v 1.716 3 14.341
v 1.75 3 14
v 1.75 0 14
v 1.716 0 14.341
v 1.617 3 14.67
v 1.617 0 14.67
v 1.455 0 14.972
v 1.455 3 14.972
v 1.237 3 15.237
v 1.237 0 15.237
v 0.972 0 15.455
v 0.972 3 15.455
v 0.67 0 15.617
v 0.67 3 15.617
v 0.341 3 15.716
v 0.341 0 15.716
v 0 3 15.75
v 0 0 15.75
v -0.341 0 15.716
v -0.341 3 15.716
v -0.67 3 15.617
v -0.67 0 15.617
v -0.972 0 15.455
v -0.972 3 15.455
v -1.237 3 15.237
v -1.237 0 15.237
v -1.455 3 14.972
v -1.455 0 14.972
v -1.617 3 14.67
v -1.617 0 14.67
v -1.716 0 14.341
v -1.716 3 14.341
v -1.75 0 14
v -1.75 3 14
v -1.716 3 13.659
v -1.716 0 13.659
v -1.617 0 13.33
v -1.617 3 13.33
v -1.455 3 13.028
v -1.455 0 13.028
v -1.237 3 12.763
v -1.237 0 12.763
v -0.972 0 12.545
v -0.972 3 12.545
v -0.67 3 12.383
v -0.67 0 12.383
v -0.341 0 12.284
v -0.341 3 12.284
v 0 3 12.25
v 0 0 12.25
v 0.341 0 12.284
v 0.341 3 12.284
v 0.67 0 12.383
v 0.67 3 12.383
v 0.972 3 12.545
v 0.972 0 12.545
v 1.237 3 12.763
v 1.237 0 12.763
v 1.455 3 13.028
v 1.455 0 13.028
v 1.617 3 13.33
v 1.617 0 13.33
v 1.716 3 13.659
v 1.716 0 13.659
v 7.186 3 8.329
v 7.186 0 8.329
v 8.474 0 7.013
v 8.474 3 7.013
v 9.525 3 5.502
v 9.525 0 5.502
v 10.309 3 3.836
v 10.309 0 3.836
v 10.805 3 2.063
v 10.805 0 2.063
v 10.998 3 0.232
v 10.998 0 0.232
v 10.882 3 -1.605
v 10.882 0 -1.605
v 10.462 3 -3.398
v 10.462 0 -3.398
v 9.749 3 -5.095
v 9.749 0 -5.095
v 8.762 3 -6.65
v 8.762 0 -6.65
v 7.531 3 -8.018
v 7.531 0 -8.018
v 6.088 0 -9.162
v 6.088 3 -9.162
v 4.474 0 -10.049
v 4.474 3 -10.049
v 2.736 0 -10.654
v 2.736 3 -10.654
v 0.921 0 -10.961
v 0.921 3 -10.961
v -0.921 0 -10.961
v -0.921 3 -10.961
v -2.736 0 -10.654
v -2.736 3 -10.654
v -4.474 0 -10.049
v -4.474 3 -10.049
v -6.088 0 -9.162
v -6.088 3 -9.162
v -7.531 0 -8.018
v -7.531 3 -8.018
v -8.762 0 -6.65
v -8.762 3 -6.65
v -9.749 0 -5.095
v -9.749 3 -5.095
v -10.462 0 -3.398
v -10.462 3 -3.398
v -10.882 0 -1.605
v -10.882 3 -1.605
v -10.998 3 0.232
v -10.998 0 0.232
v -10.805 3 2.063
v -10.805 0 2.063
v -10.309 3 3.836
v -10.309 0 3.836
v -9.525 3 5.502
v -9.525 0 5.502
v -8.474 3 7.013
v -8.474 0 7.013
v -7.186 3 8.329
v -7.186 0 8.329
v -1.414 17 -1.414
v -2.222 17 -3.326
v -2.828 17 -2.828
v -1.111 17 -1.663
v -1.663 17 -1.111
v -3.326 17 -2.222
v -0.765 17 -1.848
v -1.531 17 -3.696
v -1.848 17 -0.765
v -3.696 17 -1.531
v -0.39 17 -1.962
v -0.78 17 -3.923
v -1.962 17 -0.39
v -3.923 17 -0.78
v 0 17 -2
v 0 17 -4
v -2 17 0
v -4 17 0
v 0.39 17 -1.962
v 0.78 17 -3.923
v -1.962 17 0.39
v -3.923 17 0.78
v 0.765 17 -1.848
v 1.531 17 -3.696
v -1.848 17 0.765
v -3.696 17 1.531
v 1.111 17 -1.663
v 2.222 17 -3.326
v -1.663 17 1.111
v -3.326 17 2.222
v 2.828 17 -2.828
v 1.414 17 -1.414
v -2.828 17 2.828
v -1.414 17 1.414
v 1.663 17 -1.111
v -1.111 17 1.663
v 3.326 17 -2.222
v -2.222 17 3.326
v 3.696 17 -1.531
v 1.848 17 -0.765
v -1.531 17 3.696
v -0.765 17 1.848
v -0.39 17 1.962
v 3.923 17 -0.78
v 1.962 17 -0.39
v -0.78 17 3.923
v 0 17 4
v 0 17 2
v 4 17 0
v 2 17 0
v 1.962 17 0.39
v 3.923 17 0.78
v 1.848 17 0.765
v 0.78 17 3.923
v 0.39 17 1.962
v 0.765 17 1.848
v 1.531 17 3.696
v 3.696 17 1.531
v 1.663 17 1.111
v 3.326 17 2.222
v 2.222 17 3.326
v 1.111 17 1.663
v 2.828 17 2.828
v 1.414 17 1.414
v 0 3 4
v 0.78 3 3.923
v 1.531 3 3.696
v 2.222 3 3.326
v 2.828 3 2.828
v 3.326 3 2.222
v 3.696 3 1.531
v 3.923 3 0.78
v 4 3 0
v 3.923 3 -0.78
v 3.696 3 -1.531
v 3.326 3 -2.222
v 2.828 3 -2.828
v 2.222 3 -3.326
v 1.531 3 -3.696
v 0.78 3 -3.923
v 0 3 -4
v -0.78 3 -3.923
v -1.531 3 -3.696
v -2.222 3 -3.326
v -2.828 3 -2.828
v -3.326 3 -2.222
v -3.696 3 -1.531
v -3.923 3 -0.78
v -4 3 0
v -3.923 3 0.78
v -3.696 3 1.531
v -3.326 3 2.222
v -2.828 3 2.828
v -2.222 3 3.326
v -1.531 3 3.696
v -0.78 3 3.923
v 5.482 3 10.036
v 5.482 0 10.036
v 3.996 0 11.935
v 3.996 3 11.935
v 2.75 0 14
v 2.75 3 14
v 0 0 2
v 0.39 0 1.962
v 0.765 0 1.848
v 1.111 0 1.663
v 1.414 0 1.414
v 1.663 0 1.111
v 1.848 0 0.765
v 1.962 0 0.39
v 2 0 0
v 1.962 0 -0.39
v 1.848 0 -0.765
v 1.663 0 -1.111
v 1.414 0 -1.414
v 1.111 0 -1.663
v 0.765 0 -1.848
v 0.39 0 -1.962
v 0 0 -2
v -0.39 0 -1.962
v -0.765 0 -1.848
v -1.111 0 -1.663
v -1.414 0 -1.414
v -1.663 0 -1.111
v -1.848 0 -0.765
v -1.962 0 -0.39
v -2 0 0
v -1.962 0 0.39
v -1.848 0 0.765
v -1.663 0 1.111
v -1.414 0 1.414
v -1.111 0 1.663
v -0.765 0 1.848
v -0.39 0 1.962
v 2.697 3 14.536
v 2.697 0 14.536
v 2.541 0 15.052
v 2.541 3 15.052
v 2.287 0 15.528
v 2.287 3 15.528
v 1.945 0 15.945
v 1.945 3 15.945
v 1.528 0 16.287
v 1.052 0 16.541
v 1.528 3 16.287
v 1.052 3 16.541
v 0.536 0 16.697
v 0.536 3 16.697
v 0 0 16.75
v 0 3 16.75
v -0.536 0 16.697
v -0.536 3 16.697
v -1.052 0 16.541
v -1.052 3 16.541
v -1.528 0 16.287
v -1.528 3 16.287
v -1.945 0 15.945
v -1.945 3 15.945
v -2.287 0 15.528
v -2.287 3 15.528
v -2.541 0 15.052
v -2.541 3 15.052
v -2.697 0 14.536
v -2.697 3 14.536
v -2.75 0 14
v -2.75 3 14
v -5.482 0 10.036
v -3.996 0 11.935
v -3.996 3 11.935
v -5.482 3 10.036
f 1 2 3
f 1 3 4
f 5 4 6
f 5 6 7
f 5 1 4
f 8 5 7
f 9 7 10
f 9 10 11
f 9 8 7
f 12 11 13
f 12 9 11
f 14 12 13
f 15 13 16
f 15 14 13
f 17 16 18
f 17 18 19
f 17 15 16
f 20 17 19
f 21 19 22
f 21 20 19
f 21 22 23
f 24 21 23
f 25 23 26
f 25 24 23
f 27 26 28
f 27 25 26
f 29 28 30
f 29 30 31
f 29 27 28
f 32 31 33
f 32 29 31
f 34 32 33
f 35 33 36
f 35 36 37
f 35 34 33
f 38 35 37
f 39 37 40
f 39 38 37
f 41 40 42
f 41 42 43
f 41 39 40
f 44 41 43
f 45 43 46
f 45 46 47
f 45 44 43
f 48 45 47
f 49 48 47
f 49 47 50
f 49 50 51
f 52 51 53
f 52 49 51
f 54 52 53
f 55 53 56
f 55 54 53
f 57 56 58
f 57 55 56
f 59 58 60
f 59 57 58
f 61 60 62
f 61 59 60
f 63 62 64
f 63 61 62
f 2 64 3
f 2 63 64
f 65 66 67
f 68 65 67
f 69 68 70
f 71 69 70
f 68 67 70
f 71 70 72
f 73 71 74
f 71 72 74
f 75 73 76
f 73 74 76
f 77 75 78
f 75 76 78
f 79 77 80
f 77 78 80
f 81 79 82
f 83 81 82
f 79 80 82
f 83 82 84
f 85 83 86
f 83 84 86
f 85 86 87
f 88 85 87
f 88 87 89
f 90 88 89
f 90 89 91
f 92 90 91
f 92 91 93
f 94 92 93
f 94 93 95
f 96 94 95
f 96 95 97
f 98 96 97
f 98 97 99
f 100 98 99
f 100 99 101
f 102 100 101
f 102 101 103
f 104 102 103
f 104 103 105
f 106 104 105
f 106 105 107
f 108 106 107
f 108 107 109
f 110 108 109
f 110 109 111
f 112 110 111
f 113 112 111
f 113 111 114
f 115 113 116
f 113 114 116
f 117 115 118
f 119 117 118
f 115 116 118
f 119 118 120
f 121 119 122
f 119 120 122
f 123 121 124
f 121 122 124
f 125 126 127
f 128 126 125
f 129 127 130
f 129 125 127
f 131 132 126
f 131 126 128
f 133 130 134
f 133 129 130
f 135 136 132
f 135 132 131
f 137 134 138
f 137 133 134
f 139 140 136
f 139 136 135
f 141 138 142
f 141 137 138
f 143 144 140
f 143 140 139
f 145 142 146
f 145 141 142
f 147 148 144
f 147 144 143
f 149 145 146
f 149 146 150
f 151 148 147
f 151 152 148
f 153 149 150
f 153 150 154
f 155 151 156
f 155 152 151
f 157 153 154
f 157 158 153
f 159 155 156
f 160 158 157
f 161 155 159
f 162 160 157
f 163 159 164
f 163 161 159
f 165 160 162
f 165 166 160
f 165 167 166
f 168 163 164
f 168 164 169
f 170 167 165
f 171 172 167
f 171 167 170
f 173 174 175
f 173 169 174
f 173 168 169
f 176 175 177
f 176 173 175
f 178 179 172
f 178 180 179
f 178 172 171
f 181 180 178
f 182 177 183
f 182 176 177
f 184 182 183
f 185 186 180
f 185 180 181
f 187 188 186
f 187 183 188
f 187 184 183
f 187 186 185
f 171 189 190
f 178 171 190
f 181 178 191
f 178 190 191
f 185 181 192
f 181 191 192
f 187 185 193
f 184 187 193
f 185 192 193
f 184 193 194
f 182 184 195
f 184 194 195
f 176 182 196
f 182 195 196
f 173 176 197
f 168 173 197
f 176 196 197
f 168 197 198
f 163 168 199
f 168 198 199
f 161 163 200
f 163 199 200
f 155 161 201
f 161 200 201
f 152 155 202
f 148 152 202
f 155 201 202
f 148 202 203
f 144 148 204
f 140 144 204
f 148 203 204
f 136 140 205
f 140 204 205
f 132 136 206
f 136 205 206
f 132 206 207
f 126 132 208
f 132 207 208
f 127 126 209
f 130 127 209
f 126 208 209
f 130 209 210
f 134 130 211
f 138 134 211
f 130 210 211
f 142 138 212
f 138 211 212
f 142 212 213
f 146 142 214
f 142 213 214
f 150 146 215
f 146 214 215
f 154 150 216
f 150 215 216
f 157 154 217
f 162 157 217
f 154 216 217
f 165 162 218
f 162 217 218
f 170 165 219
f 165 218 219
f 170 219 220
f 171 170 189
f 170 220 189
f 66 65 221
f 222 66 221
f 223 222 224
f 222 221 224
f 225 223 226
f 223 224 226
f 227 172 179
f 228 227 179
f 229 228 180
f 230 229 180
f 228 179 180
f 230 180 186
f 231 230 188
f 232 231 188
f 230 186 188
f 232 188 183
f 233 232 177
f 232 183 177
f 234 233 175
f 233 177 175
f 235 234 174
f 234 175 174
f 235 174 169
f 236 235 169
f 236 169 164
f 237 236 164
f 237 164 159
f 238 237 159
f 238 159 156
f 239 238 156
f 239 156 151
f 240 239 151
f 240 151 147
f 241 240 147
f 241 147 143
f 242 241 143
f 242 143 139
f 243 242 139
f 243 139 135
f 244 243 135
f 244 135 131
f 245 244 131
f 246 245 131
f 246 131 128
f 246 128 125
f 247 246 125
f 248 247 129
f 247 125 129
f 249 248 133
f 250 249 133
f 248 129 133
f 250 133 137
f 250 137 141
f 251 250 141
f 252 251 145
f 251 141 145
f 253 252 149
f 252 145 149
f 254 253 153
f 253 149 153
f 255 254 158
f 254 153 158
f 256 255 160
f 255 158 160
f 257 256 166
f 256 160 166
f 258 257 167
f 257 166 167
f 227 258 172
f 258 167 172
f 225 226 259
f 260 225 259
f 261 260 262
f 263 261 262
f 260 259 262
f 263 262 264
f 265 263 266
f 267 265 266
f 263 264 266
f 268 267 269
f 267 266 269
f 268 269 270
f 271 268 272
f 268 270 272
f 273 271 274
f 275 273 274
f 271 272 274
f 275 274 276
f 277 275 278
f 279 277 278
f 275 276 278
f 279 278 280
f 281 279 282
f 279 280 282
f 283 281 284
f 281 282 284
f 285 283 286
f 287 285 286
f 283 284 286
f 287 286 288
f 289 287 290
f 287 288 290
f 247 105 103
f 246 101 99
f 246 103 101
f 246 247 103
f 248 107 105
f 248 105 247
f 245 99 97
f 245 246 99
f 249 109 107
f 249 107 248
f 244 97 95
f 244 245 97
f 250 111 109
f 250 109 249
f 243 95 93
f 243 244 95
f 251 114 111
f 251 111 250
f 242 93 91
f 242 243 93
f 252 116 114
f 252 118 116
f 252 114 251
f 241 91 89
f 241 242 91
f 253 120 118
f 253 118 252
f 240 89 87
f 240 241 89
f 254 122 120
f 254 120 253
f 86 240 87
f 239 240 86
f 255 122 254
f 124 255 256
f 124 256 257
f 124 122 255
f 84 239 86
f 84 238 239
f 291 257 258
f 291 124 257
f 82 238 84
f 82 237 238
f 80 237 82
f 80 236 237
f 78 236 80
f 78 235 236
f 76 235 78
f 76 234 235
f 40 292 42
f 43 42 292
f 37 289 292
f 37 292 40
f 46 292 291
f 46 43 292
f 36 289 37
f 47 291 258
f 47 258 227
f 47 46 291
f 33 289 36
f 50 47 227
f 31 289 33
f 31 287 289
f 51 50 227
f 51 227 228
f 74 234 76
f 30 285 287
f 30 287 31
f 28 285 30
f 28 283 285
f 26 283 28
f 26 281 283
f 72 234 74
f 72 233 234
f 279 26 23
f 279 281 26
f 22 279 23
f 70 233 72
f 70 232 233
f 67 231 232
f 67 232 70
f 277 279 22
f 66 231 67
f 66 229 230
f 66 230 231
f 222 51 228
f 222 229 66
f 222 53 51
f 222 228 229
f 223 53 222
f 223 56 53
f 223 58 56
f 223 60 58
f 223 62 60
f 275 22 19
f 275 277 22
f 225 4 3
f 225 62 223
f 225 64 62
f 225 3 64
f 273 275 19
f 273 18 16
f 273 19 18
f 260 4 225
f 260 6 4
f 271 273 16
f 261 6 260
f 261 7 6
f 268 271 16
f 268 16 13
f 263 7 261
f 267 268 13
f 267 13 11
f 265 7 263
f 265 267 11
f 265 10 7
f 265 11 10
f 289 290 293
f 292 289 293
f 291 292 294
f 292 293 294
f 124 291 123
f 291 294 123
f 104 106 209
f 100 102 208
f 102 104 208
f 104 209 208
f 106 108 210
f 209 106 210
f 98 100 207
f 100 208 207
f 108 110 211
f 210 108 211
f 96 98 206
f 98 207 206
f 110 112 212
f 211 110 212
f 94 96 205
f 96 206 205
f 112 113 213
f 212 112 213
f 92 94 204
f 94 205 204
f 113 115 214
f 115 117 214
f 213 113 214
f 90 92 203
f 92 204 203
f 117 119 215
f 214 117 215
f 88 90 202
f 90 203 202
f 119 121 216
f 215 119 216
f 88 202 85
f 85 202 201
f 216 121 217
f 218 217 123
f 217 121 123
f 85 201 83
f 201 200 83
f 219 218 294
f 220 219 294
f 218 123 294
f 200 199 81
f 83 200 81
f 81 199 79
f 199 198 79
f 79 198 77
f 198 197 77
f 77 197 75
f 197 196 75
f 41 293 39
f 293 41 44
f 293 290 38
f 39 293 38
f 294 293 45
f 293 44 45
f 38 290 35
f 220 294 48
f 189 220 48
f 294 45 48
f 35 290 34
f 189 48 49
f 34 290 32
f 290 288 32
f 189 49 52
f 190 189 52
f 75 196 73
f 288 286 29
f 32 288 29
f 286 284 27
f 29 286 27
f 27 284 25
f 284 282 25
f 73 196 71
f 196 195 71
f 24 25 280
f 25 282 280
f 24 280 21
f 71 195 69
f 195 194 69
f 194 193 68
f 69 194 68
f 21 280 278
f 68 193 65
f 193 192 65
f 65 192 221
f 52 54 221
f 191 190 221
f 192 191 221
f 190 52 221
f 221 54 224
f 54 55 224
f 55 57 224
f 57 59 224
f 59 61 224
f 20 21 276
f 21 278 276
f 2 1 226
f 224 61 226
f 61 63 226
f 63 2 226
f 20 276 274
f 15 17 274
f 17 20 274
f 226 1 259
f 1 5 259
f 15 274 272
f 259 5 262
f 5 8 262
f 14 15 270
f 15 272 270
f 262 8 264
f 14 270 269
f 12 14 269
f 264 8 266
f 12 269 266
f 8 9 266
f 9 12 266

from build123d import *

# Parameters (mm, degrees)
SKETCH1_R               = 11
BOSS_EXTRUDE1_DEPTH     = 3
SKETCH2_R               = 4
BOSS_EXTRUDE2_DEPTH     = 14
SKETCH3_R               = 2
CUT_EXTRUDE1_DEPTH      = 20
BOSS_EXTRUDE3_START     = -3
BOSS_EXTRUDE3_OUTLINE_R = 1.75
BOSS_EXTRUDE3_DEPTH     = 3


# Read off the part's stored shape, not the designer's step: Boss-Extrude3
with BuildPart() as part:
    # Sketch1 → Boss-Extrude1 (new body)
    with BuildSketch(Plane(origin=(0, 0, 0), x_dir=(1, 0, 0), z_dir=(0, 1, 0))):
        with Locations(Location((0, 0, 0), (0, 0, 270))):
            Circle(SKETCH1_R)
    extrude(amount=BOSS_EXTRUDE1_DEPTH)

    # Sketch2 → Boss-Extrude2 (add)
    with BuildSketch(Plane(origin=(0, 3, 0), x_dir=(1, 0, 0), z_dir=(0, 1, 0))):
        with Locations(Location((0, 0, 0), (0, 0, 270))):
            Circle(SKETCH2_R)
    extrude(amount=BOSS_EXTRUDE2_DEPTH)

    # Sketch3 → Cut-Extrude1 (cut)
    with BuildSketch(Plane(origin=(0, 17, 0), x_dir=(1, 0, 0), z_dir=(0, 1, 0))):
        with Locations(Location((0, 0, 0), (0, 0, 270))):
            Circle(SKETCH3_R)
    extrude(amount=-CUT_EXTRUDE1_DEPTH, mode=Mode.SUBTRACT)

    # Boss-Extrude3 outline → Boss-Extrude3 (add)
    with BuildSketch(Plane.XZ.offset(BOSS_EXTRUDE3_START)):
        with BuildLine():
            ThreePointArc((-2.75, 14), (-4.710548646, 10.963037737), (-7.185731367, 8.328581195))
            ThreePointArc((-7.185731367, 8.328581195), (0, 11), (7.185731367, 8.328581195))
            ThreePointArc((7.185731367, 8.328581195), (4.710548646, 10.963037737), (2.75, 14))
            ThreePointArc((2.75, 14), (0, 16.75), (-2.75, 14))
        make_face()
        with Locations((0, 14)):
            Circle(BOSS_EXTRUDE3_OUTLINE_R, mode=Mode.SUBTRACT)
    extrude(amount=BOSS_EXTRUDE3_DEPTH)


solid = part.part
